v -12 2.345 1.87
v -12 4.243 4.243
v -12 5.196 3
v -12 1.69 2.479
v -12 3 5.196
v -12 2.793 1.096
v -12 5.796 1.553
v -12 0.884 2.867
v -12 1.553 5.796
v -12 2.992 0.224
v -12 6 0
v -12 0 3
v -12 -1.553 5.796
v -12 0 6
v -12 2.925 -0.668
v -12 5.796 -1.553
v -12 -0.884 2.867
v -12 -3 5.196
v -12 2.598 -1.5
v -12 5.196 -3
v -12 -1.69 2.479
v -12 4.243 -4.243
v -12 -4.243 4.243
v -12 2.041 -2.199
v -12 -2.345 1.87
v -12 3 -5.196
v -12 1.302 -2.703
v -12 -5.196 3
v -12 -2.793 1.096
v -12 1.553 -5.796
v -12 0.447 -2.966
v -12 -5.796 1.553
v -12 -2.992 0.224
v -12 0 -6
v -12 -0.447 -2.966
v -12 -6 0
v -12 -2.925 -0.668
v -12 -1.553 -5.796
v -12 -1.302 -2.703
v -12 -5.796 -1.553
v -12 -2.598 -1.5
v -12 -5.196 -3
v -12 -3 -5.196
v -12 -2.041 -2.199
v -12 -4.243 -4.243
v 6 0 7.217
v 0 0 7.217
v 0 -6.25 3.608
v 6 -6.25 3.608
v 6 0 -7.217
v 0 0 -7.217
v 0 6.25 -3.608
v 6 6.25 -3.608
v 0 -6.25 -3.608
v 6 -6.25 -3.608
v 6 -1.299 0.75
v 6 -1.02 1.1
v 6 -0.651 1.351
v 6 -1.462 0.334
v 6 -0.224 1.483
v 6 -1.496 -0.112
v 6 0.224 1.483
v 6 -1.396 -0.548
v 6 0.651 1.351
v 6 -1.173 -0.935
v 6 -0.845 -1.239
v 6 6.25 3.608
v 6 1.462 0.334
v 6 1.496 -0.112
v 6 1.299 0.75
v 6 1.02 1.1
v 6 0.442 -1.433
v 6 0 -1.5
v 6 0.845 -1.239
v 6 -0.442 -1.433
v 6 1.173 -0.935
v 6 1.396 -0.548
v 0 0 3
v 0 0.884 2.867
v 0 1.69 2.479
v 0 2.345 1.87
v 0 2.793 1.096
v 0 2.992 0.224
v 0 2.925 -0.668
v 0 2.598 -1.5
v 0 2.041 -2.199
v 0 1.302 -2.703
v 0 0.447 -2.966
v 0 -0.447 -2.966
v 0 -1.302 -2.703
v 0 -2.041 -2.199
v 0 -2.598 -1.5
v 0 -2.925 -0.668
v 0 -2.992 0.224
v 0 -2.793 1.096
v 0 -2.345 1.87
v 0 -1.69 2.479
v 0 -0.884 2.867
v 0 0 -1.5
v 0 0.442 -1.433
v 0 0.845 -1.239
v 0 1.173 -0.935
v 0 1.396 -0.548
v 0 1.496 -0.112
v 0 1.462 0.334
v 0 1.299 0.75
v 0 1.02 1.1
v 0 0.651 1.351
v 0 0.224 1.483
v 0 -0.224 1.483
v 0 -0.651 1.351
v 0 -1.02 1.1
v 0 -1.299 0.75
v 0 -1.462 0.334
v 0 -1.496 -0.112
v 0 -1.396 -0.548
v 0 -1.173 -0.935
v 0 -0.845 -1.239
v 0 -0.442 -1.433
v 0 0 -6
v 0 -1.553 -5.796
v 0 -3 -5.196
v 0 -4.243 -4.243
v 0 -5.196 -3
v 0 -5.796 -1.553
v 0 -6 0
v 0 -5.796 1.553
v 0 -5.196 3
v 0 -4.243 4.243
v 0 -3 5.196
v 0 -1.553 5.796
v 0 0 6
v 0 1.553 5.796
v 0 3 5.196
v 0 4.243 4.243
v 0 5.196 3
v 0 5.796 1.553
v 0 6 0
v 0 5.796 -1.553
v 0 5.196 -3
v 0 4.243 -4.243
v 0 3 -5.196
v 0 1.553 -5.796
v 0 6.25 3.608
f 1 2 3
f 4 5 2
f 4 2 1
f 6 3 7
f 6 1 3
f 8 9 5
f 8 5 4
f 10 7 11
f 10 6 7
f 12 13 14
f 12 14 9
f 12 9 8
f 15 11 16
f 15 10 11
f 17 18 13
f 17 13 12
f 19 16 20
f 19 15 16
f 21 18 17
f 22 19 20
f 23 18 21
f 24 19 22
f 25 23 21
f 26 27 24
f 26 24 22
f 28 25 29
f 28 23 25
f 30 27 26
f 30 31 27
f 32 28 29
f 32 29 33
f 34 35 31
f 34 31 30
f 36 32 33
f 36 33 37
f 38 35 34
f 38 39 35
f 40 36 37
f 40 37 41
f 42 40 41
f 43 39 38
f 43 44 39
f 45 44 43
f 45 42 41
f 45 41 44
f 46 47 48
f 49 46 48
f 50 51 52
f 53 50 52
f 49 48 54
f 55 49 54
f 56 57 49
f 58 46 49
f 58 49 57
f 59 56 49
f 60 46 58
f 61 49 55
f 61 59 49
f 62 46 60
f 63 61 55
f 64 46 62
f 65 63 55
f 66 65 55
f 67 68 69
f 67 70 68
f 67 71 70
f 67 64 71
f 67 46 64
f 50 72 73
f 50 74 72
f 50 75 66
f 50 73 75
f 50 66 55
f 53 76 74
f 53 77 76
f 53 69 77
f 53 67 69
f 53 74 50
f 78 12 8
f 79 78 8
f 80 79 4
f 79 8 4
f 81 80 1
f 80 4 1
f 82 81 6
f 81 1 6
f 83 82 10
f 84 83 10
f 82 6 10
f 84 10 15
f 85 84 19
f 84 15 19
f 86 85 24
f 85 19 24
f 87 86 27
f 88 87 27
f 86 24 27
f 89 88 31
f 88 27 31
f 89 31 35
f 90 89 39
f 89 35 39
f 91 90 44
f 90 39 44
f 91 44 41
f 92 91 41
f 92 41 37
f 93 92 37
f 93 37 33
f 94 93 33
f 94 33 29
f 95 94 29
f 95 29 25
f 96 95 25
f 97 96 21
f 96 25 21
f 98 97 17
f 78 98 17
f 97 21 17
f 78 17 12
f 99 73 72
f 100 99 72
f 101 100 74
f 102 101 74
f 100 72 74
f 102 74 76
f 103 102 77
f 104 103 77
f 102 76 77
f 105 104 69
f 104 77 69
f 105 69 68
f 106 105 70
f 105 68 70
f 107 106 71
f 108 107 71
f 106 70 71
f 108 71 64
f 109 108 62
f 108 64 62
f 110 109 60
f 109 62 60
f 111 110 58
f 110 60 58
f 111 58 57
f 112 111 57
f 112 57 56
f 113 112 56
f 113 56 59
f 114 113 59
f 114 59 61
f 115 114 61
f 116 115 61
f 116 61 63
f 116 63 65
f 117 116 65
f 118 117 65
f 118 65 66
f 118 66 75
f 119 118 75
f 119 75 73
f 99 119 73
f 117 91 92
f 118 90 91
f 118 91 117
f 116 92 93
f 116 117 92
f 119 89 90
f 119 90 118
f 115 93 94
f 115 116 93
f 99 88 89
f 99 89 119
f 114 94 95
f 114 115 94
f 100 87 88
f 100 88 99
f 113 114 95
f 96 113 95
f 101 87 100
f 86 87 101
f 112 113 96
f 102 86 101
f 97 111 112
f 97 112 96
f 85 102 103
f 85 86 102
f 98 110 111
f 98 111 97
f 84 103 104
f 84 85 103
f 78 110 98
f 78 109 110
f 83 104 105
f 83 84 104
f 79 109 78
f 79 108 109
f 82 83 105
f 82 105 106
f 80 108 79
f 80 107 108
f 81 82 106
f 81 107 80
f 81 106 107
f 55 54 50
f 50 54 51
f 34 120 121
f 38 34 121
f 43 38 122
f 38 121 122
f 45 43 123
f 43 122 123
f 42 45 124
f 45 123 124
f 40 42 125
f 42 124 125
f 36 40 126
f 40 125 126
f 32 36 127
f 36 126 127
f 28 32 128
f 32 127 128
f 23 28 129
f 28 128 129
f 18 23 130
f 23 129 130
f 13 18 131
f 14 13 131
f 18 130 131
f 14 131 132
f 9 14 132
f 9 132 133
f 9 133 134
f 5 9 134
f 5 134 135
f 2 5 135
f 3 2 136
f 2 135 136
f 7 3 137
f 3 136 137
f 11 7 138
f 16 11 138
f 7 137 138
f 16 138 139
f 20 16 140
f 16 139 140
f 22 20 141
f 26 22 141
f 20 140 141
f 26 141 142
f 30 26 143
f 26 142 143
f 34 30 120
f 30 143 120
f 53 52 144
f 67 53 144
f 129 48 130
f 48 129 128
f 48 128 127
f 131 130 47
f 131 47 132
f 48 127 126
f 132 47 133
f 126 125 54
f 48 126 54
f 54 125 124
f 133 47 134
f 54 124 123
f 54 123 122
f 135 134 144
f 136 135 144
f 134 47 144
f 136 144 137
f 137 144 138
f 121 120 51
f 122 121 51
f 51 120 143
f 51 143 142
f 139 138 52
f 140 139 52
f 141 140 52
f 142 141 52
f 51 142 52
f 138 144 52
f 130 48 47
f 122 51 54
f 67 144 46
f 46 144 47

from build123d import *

# Parameters (mm, degrees)
BOSS_EXTRUDE1_DEPTH = 6
SKETCH2_R           = 6
BOSS_EXTRUDE2_DEPTH = 12
SKETCH3_R           = 3
CUT_EXTRUDE1_DEPTH  = 12
SKETCH4_R           = 1.5
CUT_EXTRUDE2_DEPTH  = 21.375127811


with BuildPart() as part:
    # Sketch1 → Boss-Extrude1 (new body)
    with BuildSketch(Plane(origin=(0, 0, 0), x_dir=(0, 0, -1), z_dir=(1, 0, 0))):
        Polygon((7.216878365, 0), (3.608439182, 6.25), (-3.608439182, 6.25), (-7.216878365, 0), (-3.608439182, -6.25), (3.608439182, -6.25), align=None)
    extrude(amount=BOSS_EXTRUDE1_DEPTH)

    # Sketch2 → Boss-Extrude2 (add)
    with BuildSketch(Plane.ZY):
        with Locations(Location((0, 0, 0), (0, 0, 180))):
            Circle(SKETCH2_R)
    extrude(amount=BOSS_EXTRUDE2_DEPTH)

    # Sketch3 → Cut-Extrude1 (cut)
    with BuildSketch(Plane.ZY.offset(12)):
        Circle(SKETCH3_R)
    extrude(amount=-CUT_EXTRUDE1_DEPTH, mode=Mode.SUBTRACT)

    # Sketch4 → Cut-Extrude2 (cut, through all)
    with BuildSketch(Plane(origin=(6, 0, 0), x_dir=(0, 0, -1), z_dir=(1, 0, 0))):
        Circle(SKETCH4_R)
    extrude(amount=-CUT_EXTRUDE2_DEPTH, mode=Mode.SUBTRACT)


solid = part.part
